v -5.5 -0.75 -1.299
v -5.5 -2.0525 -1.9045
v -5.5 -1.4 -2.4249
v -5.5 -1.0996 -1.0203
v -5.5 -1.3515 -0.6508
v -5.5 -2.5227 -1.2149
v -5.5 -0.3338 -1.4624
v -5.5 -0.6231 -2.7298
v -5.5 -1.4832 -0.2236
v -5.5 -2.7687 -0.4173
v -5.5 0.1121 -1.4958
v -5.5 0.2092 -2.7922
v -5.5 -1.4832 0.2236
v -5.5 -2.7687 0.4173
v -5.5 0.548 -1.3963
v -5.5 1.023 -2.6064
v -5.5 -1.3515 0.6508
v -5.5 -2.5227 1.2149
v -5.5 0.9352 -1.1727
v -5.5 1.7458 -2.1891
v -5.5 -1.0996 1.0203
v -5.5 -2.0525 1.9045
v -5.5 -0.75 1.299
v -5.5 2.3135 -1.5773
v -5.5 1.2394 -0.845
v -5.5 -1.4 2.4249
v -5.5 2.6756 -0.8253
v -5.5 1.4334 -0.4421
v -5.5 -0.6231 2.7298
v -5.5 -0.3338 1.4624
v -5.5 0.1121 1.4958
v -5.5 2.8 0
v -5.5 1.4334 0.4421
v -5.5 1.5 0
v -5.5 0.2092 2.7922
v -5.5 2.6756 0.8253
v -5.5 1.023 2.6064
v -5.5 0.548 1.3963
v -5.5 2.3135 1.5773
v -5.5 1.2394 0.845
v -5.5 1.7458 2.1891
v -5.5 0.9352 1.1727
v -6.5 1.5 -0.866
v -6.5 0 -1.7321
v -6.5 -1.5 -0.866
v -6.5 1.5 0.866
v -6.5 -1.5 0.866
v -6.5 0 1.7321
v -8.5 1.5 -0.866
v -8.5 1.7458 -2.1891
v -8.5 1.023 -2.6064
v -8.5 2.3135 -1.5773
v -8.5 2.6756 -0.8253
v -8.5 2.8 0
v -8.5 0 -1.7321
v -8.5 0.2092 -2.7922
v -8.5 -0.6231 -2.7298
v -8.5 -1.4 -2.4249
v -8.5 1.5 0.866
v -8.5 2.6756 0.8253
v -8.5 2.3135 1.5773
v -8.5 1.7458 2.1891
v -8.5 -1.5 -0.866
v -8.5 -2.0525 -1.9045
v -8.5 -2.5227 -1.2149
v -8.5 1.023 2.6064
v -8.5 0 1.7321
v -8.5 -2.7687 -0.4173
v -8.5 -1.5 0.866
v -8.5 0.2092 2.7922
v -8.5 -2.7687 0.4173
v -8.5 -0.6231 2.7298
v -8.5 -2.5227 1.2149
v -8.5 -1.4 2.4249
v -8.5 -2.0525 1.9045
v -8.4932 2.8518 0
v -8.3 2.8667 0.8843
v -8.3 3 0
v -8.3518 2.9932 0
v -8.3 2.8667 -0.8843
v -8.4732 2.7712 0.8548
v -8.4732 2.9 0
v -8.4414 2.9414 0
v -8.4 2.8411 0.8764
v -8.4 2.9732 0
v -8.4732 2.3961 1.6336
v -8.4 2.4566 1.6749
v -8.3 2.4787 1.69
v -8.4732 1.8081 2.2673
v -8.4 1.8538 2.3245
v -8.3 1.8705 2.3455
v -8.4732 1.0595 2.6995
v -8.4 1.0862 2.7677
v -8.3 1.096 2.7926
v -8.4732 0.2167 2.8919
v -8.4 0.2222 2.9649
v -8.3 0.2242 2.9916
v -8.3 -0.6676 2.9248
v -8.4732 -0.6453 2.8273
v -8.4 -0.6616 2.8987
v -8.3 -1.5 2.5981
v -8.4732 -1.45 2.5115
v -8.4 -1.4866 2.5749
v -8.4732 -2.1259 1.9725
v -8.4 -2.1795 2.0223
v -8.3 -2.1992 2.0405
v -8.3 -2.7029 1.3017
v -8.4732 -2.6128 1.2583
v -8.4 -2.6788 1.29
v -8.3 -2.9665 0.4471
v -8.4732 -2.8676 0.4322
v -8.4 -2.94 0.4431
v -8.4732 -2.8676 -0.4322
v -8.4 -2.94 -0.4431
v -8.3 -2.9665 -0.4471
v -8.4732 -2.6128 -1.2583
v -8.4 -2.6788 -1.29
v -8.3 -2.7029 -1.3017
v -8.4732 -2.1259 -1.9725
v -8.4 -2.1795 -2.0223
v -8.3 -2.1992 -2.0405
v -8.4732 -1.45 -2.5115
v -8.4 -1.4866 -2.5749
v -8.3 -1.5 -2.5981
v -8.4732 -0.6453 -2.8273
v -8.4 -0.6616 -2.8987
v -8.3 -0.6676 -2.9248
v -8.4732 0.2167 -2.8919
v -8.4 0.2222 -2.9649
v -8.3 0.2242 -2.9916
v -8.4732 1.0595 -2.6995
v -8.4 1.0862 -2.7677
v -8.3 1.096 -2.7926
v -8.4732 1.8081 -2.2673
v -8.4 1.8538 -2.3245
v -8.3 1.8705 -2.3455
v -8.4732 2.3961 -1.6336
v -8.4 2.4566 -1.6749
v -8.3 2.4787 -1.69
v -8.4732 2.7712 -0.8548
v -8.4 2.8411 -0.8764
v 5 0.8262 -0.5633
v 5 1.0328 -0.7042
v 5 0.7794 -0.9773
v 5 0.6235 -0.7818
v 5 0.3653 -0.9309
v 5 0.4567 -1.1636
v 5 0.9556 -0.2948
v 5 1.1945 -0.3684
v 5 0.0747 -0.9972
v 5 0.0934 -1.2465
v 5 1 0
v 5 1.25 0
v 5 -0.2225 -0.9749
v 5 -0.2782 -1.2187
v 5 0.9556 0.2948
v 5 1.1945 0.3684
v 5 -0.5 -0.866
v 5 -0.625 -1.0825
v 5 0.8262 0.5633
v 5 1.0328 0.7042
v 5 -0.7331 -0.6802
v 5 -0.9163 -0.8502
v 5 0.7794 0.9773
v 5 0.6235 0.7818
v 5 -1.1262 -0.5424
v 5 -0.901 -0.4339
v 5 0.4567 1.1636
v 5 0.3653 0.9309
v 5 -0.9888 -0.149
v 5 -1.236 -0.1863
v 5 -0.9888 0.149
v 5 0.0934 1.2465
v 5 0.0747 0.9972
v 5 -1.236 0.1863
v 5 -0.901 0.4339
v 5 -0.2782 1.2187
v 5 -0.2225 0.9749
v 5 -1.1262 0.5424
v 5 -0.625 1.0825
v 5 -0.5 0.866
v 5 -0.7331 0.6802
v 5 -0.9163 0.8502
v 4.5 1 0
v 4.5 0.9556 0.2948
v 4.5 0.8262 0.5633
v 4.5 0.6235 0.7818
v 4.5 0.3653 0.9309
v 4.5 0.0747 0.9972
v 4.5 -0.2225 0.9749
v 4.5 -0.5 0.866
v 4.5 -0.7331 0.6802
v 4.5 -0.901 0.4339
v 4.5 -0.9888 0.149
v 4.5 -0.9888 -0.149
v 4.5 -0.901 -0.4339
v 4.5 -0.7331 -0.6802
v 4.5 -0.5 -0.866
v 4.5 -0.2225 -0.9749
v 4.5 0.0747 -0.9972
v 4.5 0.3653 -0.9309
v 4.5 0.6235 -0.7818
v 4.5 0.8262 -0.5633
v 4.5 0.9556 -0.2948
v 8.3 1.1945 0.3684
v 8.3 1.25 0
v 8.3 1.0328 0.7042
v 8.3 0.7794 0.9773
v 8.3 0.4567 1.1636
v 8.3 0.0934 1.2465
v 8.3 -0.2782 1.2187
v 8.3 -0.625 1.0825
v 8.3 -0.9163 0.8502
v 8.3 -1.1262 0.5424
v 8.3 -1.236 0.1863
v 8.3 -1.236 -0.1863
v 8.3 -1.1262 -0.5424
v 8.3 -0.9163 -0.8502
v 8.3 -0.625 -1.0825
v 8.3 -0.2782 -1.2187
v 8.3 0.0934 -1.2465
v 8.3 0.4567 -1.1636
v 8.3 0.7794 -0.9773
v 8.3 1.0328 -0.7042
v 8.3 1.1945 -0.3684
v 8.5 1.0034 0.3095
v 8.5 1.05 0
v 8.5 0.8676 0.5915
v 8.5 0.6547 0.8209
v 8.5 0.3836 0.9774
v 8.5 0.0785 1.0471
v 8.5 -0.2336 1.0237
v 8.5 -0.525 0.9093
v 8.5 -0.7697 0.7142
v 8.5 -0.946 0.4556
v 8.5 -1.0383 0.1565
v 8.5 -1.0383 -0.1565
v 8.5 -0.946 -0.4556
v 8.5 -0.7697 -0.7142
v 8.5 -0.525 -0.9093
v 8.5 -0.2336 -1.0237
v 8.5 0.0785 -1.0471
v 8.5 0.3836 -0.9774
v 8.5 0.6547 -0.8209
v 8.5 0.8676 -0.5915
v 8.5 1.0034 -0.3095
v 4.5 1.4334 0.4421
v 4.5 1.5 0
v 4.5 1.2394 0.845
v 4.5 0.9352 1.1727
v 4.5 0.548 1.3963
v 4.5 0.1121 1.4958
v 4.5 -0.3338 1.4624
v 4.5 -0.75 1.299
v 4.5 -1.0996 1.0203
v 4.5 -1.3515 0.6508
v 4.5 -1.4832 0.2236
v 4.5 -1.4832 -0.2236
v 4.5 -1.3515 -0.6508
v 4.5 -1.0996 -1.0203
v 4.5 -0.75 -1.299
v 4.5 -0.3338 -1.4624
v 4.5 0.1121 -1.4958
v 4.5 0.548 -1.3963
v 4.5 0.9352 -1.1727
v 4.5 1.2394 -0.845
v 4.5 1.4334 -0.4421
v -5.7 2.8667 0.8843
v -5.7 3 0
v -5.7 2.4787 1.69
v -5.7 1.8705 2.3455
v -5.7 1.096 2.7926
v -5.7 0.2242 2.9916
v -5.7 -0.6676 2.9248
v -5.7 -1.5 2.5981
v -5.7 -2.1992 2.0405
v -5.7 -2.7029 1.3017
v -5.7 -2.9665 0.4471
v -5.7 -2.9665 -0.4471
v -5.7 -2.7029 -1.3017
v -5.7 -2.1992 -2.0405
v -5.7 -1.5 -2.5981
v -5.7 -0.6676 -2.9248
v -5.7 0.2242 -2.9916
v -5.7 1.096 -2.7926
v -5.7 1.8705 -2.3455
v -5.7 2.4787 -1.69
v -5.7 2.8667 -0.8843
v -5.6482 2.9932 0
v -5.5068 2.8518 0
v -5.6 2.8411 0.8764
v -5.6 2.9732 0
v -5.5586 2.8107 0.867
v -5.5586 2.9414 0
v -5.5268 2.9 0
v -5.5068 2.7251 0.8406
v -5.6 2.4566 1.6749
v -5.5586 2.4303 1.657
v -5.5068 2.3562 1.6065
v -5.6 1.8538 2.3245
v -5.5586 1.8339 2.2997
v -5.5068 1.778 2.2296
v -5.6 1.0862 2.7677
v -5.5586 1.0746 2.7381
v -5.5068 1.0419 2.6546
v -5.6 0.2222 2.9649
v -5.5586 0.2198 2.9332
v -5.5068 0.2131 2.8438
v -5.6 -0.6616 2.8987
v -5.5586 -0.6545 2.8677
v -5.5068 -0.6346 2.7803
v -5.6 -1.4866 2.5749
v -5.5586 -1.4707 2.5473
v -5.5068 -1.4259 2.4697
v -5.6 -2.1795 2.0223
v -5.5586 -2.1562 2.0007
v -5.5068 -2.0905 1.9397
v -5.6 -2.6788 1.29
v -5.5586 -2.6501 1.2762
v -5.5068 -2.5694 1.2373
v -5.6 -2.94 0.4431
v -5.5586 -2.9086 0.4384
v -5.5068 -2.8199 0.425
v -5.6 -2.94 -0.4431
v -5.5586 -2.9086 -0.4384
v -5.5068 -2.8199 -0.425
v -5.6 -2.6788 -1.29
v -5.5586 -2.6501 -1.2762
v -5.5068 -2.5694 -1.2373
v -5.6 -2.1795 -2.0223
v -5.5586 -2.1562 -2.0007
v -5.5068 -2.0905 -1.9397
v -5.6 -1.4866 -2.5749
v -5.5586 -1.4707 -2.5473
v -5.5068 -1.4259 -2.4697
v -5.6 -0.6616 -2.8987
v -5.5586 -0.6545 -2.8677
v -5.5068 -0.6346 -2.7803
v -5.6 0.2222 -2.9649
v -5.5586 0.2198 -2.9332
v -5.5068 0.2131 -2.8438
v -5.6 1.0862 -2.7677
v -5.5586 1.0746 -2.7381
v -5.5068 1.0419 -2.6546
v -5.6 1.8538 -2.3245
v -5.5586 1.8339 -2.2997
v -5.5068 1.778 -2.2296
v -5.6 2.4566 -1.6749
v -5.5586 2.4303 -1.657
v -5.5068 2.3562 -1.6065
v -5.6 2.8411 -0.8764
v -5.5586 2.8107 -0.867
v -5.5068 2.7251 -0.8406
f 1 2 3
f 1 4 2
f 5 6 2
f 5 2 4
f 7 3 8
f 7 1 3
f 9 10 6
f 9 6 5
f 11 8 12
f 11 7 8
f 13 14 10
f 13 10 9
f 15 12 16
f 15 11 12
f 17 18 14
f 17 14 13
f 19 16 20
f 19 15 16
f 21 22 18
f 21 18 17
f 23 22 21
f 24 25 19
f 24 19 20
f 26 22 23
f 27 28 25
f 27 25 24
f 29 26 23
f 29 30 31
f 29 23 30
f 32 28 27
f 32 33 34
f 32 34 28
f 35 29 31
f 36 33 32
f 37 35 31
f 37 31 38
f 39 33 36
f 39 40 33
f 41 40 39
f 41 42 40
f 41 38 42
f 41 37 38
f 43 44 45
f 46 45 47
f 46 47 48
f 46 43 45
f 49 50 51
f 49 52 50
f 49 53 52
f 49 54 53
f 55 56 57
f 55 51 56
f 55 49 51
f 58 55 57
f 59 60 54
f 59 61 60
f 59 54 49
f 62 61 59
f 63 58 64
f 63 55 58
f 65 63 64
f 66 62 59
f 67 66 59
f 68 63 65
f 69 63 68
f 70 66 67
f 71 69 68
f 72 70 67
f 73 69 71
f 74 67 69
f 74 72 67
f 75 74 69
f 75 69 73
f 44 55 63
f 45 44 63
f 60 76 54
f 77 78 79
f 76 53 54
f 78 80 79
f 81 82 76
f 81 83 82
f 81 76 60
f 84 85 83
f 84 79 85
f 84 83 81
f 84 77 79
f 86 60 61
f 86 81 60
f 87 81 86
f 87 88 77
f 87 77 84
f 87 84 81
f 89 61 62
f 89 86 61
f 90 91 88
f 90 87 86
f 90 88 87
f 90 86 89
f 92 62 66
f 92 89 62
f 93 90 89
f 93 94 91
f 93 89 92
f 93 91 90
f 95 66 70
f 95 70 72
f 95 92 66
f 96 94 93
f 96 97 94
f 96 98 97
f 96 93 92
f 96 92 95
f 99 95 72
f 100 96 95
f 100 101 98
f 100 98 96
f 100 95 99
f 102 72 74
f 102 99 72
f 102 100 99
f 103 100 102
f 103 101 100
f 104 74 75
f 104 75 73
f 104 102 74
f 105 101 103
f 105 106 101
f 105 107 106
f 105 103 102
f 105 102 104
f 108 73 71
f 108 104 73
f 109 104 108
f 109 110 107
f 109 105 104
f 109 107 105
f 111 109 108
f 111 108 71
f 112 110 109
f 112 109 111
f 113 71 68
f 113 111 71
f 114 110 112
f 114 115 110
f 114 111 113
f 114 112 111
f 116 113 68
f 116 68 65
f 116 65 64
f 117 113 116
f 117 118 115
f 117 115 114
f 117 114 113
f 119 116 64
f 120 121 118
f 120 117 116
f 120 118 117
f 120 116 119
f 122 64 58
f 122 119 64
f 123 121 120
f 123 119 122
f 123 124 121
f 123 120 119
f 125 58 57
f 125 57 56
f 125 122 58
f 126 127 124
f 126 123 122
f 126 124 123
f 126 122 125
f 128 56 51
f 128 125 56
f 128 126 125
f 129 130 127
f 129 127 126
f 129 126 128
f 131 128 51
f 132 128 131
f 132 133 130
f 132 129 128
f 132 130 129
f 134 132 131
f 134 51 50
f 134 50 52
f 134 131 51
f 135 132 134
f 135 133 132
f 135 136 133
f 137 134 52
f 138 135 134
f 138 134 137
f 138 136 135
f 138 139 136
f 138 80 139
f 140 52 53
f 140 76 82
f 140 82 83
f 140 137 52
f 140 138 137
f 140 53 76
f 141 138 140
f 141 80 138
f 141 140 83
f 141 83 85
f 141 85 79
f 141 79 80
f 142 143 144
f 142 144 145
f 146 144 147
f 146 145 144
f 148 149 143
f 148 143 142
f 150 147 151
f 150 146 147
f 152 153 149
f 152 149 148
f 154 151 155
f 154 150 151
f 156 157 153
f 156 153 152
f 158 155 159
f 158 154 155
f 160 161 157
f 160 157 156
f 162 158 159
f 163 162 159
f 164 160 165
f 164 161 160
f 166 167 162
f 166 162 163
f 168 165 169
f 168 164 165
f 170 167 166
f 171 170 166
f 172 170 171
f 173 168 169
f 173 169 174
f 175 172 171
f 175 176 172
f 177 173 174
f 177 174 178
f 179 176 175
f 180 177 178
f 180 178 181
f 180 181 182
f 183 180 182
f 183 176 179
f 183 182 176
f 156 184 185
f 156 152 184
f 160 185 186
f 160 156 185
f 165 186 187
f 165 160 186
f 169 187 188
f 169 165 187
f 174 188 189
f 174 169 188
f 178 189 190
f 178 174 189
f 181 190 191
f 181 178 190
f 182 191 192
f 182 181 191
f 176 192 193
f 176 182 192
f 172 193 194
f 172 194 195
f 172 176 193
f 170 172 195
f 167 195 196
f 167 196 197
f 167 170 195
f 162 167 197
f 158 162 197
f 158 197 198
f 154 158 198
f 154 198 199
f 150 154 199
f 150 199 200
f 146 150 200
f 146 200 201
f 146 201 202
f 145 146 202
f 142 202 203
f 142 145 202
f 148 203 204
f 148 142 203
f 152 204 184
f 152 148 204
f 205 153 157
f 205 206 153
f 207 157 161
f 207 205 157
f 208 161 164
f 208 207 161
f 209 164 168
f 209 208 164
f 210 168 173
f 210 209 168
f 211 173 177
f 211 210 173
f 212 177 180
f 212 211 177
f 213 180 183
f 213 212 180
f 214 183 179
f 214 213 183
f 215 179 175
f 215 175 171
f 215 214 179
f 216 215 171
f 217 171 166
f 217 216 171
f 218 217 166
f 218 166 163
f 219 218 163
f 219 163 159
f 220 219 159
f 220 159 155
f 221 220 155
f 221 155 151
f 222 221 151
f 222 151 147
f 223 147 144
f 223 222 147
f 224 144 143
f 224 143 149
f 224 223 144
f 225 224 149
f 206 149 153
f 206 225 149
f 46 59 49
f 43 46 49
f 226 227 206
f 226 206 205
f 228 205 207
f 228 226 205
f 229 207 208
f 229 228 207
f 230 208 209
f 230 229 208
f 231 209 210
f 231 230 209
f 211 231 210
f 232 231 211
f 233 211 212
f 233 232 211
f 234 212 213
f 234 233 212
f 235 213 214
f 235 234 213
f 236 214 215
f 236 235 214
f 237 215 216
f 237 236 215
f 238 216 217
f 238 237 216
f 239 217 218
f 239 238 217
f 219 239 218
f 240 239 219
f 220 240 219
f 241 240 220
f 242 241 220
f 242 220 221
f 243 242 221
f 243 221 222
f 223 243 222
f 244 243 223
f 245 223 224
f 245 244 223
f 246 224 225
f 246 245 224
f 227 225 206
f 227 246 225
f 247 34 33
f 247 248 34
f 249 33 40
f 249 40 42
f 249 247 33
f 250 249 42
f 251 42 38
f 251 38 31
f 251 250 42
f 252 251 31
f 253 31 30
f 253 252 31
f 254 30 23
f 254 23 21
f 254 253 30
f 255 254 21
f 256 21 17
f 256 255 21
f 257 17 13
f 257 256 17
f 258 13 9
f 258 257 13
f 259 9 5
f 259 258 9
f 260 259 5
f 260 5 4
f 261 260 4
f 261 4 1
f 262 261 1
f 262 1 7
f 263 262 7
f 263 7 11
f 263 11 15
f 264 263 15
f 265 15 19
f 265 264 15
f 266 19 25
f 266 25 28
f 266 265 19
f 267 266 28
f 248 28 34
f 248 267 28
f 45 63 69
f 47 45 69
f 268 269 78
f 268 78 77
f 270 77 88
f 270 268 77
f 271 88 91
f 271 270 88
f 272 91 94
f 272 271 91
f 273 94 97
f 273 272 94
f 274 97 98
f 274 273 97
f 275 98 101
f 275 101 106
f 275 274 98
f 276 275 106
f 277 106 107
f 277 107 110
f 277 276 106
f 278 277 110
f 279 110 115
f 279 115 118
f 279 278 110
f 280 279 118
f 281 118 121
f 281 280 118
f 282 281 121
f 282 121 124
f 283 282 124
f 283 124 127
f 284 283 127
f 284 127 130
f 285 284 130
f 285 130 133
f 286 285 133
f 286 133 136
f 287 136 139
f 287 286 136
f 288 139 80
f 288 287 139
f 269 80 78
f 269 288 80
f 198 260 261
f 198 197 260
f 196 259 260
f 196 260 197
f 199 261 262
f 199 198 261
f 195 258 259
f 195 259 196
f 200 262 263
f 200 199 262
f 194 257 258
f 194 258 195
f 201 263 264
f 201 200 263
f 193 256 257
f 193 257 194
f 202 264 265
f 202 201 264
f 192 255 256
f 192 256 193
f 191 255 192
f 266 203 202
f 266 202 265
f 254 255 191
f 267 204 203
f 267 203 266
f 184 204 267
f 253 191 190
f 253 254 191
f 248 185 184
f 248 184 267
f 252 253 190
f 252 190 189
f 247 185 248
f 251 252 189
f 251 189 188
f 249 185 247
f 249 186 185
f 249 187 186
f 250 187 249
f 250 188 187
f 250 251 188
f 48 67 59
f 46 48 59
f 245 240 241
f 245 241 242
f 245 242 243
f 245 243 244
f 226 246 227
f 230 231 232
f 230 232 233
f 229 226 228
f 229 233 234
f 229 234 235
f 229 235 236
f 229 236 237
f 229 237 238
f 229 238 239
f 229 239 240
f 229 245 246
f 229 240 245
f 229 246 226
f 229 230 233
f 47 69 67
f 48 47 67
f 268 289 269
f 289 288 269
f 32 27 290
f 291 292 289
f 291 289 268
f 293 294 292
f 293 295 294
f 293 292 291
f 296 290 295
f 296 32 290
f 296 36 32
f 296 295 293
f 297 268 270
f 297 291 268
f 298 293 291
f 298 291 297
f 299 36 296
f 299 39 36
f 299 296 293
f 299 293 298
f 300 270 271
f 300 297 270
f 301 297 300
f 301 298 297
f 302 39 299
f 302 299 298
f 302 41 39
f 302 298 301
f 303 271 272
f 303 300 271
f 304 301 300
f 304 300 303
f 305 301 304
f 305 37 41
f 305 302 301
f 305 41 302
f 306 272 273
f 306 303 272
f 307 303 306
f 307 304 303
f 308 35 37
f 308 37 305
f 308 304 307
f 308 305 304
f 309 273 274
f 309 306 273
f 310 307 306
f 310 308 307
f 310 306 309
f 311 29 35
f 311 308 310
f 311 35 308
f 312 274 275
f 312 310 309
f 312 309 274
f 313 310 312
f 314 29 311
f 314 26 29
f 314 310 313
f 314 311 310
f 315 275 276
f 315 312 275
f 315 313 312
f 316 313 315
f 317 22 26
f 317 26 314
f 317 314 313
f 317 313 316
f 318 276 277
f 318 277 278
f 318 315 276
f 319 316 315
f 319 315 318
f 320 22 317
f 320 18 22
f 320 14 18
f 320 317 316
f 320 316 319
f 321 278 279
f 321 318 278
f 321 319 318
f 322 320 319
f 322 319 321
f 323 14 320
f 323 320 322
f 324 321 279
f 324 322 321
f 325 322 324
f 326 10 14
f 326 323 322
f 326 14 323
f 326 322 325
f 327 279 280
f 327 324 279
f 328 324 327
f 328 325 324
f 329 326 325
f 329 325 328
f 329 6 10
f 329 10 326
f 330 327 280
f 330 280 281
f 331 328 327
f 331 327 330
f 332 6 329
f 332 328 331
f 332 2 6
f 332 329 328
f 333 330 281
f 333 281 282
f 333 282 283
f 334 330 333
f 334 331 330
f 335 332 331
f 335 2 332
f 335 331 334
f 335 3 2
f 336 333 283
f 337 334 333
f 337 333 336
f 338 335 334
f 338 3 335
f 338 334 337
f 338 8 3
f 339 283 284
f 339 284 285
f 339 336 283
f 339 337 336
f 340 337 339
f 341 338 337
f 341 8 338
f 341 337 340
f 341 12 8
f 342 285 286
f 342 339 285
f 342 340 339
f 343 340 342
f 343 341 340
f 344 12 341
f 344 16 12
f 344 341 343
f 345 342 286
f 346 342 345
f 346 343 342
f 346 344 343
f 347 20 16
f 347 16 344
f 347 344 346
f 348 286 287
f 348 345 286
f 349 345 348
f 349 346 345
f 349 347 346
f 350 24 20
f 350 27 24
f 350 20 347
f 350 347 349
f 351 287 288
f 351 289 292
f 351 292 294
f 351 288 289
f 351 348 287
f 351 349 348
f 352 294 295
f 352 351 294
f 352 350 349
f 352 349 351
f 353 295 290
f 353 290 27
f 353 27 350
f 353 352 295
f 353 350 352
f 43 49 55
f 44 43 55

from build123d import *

# Parameters (mm, degrees)
FILLET_1_R          = 0.2
CHAMFER_1_SIZE      = 0.2
SKETCH_3_W          = 0.5
SKETCH_3_H          = 0.25
CUT_EXTRUDE_1_DEPTH = 2


with BuildPart() as part:
    # 草图1 → 旋转1 (revolve)
    with BuildSketch(Plane.XY):
        Polygon((-8.5, 0), (-8.5, 3), (-5.5, 3), (-5.5, 1.5), (4.5, 1.5), (4.5, 1.25), (8.5, 1.25), (8.5, 0), align=None)
    revolve(axis=Axis((-8.5, 0, 0), (1, 0, 0)))

    # 圆角1
    fillet_1_edges = [part.edges().sort_by_distance(p)[0] for p in [
        (-5.5, -3, 0),
        (-8.5, -3, 0),
    ]]
    fillet(fillet_1_edges, radius=FILLET_1_R)

    # 倒角1
    chamfer_1_edges = [part.edges().sort_by_distance(p)[0] for p in [
        (8.5, -1.25, 0),
    ]]
    chamfer(chamfer_1_edges, length=CHAMFER_1_SIZE)

    # 草图3 → 切除-旋转1 (revolve, cut)
    with BuildSketch(Plane.XY):
        with Locations((4.75, 1.125)):
            Rectangle(SKETCH_3_W, SKETCH_3_H)
    revolve(axis=Axis((4.5, 0, 0), (1, 0, 0)), mode=Mode.SUBTRACT)

    # 草图4 → 切除-拉伸1 (cut)
    with BuildSketch(Plane.ZY.offset(8.5)):
        Polygon((1.732050808, 0), (0.866025404, 1.5), (-0.866025404, 1.5), (-1.732050808, 0), (-0.866025404, -1.5), (0.866025404, -1.5), align=None)
    extrude(amount=-CUT_EXTRUDE_1_DEPTH, mode=Mode.SUBTRACT)


solid = part.part
